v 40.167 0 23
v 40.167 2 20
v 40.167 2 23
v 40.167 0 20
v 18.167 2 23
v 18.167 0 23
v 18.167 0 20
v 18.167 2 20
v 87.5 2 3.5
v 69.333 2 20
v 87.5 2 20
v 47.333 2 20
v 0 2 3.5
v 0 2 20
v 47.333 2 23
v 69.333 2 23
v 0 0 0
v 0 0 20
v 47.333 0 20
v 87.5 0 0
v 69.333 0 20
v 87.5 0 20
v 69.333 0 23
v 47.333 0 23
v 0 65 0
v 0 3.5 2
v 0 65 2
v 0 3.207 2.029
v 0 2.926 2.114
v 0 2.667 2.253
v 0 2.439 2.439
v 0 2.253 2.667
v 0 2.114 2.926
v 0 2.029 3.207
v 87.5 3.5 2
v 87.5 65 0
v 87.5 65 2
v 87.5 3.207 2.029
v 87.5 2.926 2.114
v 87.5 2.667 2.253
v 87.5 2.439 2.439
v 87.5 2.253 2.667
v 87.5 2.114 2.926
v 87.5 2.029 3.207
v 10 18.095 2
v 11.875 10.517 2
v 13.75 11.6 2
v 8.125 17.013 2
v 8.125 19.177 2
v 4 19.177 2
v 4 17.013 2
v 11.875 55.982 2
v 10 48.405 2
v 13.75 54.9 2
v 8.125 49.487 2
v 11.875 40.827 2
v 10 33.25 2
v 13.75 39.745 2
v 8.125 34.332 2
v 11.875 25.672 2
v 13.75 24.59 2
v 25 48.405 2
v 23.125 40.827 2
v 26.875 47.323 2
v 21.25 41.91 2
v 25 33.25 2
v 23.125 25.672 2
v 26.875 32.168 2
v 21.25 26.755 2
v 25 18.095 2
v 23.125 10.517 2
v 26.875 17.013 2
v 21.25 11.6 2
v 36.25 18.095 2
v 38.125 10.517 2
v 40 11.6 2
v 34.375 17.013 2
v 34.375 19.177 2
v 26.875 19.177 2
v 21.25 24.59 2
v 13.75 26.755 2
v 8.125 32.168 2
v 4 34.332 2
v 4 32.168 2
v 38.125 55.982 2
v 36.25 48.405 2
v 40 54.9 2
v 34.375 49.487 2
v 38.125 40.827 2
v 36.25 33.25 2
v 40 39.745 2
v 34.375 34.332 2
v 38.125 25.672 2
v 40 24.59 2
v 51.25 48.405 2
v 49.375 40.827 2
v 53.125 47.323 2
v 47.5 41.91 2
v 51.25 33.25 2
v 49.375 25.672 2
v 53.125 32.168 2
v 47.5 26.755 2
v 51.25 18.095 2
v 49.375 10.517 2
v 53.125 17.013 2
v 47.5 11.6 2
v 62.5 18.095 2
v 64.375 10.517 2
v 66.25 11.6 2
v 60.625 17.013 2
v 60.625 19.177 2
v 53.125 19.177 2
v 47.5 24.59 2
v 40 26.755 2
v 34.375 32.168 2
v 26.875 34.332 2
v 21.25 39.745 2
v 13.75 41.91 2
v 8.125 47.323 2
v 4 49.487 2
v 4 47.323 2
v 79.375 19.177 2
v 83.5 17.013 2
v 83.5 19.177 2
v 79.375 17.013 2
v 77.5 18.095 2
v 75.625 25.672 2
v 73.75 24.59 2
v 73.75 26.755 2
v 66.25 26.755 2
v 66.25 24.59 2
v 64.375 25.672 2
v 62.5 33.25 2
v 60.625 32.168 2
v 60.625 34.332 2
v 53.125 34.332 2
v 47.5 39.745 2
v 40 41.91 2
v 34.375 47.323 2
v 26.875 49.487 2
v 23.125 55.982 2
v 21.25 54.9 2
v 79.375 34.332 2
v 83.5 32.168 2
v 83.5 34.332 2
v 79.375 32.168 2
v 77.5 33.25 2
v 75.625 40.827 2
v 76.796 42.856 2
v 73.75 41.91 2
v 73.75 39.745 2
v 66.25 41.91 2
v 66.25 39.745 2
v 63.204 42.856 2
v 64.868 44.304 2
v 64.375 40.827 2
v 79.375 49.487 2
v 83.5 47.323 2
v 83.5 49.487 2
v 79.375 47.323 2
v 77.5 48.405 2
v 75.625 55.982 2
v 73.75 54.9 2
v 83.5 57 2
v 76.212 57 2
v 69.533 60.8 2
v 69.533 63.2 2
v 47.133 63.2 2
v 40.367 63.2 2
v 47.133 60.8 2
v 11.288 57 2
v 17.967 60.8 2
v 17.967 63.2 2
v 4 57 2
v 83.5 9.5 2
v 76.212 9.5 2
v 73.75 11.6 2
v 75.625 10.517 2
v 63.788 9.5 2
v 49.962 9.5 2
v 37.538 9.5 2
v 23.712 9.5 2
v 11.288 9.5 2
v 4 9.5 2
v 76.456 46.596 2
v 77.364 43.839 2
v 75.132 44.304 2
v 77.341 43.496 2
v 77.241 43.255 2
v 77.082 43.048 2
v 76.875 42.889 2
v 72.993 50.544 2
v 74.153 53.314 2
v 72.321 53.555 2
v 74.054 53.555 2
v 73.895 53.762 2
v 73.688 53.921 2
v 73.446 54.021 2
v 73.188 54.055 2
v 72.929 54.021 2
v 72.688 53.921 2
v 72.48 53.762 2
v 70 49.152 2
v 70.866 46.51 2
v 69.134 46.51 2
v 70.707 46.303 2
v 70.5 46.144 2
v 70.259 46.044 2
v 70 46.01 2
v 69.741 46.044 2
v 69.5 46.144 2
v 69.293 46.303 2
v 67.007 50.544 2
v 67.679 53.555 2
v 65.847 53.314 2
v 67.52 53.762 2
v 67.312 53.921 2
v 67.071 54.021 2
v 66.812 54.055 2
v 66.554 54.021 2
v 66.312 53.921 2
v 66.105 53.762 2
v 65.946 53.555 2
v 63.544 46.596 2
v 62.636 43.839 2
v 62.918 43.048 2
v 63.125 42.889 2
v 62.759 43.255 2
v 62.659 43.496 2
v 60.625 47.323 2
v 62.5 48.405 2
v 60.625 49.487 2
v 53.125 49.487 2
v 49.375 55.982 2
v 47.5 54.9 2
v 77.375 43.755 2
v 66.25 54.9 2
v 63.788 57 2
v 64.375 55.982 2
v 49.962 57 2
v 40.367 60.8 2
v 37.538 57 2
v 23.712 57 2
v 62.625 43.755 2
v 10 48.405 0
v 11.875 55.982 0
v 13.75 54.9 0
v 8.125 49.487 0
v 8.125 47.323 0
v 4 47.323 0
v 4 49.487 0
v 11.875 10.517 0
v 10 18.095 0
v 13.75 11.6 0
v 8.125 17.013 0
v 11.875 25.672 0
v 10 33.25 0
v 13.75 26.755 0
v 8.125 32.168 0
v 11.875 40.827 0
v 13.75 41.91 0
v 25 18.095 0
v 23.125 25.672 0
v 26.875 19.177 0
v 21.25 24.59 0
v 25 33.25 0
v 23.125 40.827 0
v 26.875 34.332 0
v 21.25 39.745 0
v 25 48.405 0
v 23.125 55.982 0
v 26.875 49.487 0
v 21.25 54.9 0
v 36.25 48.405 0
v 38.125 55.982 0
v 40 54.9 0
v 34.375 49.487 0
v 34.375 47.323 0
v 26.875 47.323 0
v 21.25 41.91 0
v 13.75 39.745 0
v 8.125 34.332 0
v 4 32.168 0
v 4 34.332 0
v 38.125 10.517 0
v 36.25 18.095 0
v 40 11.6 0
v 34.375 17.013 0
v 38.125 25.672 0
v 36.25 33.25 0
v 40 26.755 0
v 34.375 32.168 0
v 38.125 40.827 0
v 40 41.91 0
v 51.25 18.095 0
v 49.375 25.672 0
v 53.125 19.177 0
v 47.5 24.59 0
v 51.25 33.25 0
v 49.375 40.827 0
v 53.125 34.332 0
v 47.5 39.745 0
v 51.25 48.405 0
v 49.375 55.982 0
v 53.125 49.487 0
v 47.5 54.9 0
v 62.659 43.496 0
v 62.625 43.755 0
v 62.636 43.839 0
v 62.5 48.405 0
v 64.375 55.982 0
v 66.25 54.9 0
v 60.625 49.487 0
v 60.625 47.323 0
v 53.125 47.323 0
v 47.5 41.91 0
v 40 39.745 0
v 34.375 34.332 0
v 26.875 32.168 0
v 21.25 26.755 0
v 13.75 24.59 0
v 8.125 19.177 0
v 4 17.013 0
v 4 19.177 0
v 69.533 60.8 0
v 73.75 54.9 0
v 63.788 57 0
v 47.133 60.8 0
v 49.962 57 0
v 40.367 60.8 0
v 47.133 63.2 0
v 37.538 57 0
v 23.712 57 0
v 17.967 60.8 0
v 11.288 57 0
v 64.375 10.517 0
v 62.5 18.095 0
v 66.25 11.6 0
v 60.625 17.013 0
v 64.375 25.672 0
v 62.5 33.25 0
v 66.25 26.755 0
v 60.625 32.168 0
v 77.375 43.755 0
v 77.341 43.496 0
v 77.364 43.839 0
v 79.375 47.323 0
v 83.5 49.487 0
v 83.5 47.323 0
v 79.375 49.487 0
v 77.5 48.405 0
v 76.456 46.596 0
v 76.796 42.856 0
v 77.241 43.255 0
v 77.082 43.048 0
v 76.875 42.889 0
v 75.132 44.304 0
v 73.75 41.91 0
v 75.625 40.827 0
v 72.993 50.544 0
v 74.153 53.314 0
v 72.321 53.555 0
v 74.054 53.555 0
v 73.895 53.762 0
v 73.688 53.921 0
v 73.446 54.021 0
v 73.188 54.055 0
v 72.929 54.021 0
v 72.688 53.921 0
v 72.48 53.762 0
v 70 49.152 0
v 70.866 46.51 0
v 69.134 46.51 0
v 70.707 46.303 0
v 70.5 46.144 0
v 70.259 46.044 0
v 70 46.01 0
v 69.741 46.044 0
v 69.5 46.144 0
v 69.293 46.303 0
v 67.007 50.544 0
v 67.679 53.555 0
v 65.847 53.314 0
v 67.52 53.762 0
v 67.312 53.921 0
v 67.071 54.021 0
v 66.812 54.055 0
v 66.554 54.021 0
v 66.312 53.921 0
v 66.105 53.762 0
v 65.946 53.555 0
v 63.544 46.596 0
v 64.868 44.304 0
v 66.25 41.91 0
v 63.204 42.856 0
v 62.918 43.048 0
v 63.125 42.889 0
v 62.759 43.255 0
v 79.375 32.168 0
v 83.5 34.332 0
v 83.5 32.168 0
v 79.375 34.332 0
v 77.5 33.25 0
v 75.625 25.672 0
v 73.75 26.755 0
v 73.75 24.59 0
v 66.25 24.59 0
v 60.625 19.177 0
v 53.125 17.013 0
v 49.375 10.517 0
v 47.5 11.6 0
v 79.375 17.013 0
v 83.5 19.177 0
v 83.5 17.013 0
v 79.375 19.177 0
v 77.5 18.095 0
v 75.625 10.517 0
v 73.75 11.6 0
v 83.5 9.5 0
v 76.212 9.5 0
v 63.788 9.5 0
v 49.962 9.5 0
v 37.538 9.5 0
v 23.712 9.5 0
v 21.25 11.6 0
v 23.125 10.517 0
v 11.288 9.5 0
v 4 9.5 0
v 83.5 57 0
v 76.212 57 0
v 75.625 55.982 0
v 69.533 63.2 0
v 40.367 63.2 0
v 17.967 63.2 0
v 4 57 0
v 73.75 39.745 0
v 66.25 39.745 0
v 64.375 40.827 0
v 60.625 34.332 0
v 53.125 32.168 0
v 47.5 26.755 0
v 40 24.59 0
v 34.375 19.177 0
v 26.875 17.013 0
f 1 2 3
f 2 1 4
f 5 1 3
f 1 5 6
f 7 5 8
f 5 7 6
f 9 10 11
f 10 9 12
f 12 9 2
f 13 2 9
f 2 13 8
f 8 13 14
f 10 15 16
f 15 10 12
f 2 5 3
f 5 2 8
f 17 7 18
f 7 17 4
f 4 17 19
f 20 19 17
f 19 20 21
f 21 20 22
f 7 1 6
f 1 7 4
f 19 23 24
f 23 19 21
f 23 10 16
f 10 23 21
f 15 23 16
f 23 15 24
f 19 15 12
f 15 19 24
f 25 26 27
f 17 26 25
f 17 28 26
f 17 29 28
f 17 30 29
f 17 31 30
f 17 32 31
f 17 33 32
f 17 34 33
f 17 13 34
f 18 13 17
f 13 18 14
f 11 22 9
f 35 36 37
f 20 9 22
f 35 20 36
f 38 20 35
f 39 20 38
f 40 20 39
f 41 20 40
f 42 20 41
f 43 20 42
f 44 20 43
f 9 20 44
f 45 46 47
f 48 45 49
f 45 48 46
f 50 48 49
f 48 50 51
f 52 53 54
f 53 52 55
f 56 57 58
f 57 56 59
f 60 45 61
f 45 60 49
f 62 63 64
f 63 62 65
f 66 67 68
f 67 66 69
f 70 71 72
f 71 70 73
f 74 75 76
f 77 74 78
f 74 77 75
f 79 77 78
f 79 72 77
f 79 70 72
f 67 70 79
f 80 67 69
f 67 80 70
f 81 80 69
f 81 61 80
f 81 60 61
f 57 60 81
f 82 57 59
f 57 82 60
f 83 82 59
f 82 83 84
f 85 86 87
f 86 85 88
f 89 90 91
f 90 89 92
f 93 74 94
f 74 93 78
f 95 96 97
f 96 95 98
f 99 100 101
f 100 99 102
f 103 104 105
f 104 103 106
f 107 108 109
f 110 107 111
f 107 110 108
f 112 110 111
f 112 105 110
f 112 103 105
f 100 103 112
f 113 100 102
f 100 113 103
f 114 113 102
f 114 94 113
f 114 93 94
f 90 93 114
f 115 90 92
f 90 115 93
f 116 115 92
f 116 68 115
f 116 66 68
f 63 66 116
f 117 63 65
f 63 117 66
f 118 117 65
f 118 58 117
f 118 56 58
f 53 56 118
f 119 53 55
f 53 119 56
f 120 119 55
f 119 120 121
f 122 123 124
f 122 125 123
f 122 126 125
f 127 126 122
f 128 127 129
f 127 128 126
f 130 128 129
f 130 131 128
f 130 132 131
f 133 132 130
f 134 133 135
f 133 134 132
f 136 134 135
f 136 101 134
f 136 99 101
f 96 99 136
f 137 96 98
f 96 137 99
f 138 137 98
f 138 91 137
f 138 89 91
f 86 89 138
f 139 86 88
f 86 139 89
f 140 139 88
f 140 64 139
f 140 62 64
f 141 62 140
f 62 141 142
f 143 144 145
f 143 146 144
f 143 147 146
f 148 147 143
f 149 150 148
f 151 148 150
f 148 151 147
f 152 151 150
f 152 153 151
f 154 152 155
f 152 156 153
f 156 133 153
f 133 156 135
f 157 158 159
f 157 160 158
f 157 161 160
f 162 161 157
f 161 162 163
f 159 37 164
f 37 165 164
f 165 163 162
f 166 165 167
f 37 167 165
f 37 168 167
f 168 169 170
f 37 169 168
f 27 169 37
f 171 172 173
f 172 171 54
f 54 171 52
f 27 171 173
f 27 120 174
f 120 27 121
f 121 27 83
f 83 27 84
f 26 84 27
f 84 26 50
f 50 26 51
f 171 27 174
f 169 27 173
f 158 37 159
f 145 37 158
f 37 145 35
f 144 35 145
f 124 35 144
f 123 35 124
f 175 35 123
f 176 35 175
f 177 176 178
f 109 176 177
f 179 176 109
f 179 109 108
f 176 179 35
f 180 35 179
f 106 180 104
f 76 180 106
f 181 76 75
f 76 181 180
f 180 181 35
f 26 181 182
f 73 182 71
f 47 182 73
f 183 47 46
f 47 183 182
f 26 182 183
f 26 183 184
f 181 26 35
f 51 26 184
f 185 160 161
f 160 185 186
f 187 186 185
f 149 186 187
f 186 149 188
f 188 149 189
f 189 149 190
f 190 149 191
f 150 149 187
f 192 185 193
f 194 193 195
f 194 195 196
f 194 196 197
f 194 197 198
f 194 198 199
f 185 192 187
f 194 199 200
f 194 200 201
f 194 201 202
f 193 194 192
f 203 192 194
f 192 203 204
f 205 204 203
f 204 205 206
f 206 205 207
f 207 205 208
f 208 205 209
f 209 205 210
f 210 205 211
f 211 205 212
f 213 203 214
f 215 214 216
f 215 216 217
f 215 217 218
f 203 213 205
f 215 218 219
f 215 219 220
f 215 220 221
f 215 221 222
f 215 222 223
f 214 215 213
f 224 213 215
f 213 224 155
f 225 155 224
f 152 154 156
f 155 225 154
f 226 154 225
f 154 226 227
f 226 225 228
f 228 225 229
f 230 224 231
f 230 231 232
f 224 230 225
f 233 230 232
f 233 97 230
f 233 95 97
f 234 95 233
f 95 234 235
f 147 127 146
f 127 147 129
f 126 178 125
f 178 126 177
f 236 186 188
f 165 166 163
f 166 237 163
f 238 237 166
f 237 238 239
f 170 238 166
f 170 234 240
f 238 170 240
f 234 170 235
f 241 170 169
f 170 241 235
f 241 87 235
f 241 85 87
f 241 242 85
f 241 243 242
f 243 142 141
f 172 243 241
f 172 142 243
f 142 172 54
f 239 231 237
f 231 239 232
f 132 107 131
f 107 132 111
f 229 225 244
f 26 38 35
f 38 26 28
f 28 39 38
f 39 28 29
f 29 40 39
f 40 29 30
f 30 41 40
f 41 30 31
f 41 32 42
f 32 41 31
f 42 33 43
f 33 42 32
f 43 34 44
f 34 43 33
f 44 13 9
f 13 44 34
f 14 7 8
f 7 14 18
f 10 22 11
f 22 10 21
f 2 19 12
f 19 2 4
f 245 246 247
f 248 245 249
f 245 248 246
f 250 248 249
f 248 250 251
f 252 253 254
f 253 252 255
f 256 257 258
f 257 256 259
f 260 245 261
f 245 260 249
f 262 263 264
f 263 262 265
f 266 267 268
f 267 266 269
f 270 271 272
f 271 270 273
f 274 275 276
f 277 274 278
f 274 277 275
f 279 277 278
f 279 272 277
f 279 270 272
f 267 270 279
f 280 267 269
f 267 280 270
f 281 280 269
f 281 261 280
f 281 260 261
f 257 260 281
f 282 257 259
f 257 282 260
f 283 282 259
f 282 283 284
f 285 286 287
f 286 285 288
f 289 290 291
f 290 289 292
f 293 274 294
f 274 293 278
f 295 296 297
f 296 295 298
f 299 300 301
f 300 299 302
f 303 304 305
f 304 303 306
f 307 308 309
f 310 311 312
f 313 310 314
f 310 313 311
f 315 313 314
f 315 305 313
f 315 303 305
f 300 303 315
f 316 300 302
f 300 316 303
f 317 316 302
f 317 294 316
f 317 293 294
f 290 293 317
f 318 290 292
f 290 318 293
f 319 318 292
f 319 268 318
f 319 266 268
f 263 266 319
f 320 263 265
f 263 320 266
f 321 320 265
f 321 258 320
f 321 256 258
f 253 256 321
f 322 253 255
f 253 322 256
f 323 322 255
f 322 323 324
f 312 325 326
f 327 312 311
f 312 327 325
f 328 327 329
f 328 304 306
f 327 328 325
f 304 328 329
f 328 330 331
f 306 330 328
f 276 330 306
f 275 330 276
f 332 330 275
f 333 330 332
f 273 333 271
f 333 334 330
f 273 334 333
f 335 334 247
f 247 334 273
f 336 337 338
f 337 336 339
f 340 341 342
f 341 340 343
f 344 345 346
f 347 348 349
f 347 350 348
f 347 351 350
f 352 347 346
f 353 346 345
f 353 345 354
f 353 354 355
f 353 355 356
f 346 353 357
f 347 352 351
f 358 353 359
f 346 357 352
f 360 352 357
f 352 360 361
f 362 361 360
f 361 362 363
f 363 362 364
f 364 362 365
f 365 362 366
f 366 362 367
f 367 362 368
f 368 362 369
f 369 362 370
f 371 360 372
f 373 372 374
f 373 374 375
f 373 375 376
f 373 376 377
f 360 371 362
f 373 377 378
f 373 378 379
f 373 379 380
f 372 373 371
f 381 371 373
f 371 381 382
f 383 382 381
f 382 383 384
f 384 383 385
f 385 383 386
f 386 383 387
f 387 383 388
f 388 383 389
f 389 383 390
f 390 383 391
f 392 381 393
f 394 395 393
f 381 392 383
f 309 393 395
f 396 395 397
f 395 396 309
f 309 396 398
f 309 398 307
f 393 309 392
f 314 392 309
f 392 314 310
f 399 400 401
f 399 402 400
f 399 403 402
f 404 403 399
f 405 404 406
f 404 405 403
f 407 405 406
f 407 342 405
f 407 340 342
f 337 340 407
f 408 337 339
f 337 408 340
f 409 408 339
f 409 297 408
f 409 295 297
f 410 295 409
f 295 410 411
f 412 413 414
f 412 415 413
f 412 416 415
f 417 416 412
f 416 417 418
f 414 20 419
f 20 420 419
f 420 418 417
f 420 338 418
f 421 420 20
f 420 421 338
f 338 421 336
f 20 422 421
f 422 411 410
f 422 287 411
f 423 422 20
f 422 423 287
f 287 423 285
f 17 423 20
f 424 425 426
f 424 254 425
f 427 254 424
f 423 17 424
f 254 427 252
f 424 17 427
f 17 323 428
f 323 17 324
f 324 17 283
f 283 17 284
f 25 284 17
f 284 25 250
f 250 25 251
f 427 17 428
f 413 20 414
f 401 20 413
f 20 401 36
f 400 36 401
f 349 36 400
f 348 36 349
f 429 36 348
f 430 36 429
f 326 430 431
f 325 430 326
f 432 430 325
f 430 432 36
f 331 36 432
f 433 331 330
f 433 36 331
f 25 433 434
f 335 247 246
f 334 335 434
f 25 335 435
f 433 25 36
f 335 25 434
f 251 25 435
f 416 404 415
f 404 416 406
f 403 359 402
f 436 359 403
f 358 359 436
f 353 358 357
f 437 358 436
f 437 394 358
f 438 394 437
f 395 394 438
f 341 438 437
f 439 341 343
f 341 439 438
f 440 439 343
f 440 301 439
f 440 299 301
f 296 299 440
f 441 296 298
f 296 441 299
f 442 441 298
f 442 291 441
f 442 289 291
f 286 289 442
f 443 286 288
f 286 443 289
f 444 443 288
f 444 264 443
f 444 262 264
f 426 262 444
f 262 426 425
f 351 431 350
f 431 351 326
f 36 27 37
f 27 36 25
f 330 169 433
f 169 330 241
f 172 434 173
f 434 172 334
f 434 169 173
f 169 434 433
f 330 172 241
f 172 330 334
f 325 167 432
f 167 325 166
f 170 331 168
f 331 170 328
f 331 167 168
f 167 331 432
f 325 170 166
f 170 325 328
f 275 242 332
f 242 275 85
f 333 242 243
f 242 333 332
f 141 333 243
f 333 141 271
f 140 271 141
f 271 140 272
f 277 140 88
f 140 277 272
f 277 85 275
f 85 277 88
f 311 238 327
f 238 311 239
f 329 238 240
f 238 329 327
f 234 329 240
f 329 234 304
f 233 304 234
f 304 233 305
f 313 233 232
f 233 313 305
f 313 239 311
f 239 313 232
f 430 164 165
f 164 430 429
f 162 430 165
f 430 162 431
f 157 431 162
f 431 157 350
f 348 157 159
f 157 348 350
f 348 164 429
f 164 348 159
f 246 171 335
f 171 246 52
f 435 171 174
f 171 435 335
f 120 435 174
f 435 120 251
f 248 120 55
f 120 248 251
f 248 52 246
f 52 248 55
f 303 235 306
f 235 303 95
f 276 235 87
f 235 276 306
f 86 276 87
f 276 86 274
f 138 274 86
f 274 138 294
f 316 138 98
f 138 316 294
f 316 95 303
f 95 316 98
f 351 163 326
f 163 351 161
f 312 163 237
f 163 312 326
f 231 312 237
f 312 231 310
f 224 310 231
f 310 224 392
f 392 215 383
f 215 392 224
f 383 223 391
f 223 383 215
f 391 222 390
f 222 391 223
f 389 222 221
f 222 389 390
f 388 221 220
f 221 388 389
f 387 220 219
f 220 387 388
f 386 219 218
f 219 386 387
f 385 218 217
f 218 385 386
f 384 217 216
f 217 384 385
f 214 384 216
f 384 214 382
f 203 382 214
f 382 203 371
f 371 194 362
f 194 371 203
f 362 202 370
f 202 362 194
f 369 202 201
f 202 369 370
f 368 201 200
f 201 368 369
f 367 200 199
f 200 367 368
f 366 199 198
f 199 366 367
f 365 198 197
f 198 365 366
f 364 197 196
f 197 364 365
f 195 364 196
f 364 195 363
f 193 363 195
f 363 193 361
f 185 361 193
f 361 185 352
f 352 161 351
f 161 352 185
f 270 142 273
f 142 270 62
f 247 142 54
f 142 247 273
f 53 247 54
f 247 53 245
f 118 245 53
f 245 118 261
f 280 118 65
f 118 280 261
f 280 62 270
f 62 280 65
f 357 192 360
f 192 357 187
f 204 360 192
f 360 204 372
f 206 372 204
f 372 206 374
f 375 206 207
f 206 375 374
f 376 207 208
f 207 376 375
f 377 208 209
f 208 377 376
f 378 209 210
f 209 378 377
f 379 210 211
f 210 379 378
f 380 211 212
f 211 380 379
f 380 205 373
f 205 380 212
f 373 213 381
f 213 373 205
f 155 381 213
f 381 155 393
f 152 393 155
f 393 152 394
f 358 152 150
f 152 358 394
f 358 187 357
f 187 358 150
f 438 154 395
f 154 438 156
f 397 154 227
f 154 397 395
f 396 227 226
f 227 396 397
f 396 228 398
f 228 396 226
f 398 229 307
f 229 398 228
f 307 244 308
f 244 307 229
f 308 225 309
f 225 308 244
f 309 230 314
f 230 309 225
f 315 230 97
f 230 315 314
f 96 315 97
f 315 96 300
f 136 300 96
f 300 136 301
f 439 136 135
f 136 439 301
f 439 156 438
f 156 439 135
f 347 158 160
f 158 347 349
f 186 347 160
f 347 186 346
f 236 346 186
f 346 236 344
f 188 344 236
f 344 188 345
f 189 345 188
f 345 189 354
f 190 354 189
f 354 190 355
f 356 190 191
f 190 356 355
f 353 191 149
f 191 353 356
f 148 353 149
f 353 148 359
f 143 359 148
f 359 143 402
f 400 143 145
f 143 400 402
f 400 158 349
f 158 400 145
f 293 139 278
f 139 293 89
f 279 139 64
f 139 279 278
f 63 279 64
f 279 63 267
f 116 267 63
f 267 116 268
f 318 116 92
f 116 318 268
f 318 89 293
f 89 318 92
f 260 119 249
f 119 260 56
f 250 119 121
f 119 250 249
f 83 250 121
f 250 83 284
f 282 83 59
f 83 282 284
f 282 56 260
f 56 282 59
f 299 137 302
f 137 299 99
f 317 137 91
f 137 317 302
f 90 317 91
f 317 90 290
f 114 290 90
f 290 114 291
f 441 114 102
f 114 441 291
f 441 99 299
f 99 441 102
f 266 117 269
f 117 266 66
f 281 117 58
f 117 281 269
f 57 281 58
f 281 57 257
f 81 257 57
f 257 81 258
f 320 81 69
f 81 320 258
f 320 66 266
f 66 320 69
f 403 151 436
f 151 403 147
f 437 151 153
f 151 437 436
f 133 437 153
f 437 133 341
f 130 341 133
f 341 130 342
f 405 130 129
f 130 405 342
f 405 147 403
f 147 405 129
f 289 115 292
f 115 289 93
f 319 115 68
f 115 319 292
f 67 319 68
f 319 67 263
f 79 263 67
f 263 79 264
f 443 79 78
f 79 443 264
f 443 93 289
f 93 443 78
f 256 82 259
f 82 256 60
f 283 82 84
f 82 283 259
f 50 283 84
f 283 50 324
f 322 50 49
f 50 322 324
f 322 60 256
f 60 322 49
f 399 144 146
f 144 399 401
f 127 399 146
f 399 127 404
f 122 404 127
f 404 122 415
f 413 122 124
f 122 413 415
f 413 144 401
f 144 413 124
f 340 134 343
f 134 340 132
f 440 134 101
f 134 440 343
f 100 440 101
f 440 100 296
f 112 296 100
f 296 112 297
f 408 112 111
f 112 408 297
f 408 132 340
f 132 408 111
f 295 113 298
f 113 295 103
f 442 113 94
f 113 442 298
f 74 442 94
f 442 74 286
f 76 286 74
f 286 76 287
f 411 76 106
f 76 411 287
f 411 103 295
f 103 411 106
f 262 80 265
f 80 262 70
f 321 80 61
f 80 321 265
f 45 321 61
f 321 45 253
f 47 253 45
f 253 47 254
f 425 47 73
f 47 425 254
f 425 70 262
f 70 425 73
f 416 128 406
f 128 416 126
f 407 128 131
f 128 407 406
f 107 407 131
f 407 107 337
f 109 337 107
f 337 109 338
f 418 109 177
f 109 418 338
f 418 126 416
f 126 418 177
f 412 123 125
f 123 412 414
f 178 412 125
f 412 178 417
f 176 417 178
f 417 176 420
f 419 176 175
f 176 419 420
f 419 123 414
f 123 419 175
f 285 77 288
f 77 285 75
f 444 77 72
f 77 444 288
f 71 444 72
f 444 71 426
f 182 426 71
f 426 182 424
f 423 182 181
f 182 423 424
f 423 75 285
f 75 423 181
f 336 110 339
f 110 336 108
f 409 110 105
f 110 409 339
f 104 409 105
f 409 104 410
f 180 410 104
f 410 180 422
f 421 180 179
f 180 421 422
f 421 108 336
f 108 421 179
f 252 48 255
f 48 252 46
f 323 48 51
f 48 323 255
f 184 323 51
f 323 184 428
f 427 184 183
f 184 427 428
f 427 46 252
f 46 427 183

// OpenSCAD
// Wake flat v1: one-piece L riser, printed flat (plate on the bed, wall standing up).
// Wall tabs on the top edge of the wall drop by gravity into slots near the free edge of the next plate.
// Plate and hex layout follow Wake v6: same hex size/gap, borders, and small W.
//
// Axes: x = width, y = plate depth (y=0 is the wall side), z = up.

half_length = true;                       // prototype: half of 175 mm
width       = half_length ? 87.5 : 175;
plate_d     = 65;                         // plate depth, wall side to free edge
plate_t     = 2;
wall_t      = 2;
wall_h      = 20;                         // lip height, measured from the bed
inner_r     = 1.5;                        // fillet where the wall meets the plate

// hex grid (same as Wake)
hex_size   = 15;
hex_gap    = 2.5;
border_x   = 4;
border_wall = 6;                          // clear zone between the fillet and the hex area
border_free = 8;                          // clear zone along the free edge, holds the slots

// small W inside one hex, far corner from the wall at max x
small_w_on     = true;
small_w_w      = 0.85;
small_w_h      = 0.62;
small_w_stroke = 2.0;
letter_flip    = true;

// tabs on the wall top, slots in the plate
tab_count   = half_length ? 2 : 3;
tab_len     = 22;
tab_h       = 3;
tab_clear   = 0.2;                        // slot clearance per side
slot_from_edge = 3;                       // free edge to slot centre line
tab_xs = [for (i = [0 : tab_count - 1]) width * (i + 1) / (tab_count + 1)];

$fn = 32;

function cells(w, h) =
    let (pitch = hex_size + hex_gap, step_x = pitch * 0.75, step_z = pitch * 0.866,
         cx = w / 2, cz = h / 2,
         ncols = ceil(w / (2 * step_x)) + 2, nrows = ceil(h / (2 * step_z)) + 2)
    [for (col = [-ncols : ncols]) for (row = [-nrows : nrows])
        let (parity = ((col % 2) + 2) % 2,
             x = cx + col * step_x,
             z = cz + row * step_z + (parity == 0 ? 0 : step_z / 2))
        [x, z]];

function corner_cell(w, h) =
    let (c = [for (p = cells(w, h)) if (p[0] - hex_size / 2 >= 0 && p[0] + hex_size / 2 <= w && p[1] - hex_size / 2 >= 0 && p[1] + hex_size / 2 <= h) p],
         best = max([for (p = c) p[0] + p[1]]))
    [for (p = c) if (p[0] + p[1] == best) p][0];

module w_shape2d(lw, lh, stroke) {
    f = letter_flip ? -1 : 1;
    pts = [[-lw / 2, f * lh / 2], [-lw / 4, -f * lh / 2], [0, f * lh * 0.15], [lw / 4, -f * lh / 2], [lw / 2, f * lh / 2]];
    for (i = [0 : 3]) hull() {
        translate(pts[i]) circle(d = stroke, $fn = 24);
        translate(pts[i + 1]) circle(d = stroke, $fn = 24);
    }
}

module hex_cut2d(w, h) {
    cc = corner_cell(w, h);
    difference() {
        intersection() {
            for (c = cells(w, h)) translate(c) circle(d = hex_size, $fn = 6);
            square([w, h]);
        }
        if (small_w_on)
            translate(cc) w_shape2d(hex_size * small_w_w, hex_size * small_w_h, small_w_stroke);
    }
}

// (y, z) profile of plate + wall + fillet, extruded along x
module body() {
    rotate([90, 0, 90]) linear_extrude(width) union() {
        square([plate_d, plate_t]);
        square([wall_t, wall_h]);
        difference() {
            translate([wall_t - 0.01, plate_t - 0.01]) square([inner_r + 0.01, inner_r + 0.01]);
            translate([wall_t + inner_r, plate_t + inner_r]) circle(r = inner_r);
        }
    }
}

module tabs() {
    for (x = tab_xs)
        translate([x - tab_len / 2, 0, wall_h - 0.01]) cube([tab_len, wall_t, tab_h + 0.01]);
}

module slots() {
    sw = wall_t + 2 * tab_clear;
    sl = tab_len + 2 * tab_clear;
    for (x = tab_xs)
        translate([x - sl / 2, plate_d - slot_from_edge - sw / 2, -1]) cube([sl, sw, plate_t + 2]);
}

module riser() {
    hy0 = wall_t + inner_r + border_wall;
    hh  = plate_d - hy0 - border_free;
    difference() {
        union() { body(); tabs(); }
        translate([border_x, hy0, -1]) linear_extrude(plate_t + 2) hex_cut2d(width - 2 * border_x, hh);
        slots();
    }
}

riser();
